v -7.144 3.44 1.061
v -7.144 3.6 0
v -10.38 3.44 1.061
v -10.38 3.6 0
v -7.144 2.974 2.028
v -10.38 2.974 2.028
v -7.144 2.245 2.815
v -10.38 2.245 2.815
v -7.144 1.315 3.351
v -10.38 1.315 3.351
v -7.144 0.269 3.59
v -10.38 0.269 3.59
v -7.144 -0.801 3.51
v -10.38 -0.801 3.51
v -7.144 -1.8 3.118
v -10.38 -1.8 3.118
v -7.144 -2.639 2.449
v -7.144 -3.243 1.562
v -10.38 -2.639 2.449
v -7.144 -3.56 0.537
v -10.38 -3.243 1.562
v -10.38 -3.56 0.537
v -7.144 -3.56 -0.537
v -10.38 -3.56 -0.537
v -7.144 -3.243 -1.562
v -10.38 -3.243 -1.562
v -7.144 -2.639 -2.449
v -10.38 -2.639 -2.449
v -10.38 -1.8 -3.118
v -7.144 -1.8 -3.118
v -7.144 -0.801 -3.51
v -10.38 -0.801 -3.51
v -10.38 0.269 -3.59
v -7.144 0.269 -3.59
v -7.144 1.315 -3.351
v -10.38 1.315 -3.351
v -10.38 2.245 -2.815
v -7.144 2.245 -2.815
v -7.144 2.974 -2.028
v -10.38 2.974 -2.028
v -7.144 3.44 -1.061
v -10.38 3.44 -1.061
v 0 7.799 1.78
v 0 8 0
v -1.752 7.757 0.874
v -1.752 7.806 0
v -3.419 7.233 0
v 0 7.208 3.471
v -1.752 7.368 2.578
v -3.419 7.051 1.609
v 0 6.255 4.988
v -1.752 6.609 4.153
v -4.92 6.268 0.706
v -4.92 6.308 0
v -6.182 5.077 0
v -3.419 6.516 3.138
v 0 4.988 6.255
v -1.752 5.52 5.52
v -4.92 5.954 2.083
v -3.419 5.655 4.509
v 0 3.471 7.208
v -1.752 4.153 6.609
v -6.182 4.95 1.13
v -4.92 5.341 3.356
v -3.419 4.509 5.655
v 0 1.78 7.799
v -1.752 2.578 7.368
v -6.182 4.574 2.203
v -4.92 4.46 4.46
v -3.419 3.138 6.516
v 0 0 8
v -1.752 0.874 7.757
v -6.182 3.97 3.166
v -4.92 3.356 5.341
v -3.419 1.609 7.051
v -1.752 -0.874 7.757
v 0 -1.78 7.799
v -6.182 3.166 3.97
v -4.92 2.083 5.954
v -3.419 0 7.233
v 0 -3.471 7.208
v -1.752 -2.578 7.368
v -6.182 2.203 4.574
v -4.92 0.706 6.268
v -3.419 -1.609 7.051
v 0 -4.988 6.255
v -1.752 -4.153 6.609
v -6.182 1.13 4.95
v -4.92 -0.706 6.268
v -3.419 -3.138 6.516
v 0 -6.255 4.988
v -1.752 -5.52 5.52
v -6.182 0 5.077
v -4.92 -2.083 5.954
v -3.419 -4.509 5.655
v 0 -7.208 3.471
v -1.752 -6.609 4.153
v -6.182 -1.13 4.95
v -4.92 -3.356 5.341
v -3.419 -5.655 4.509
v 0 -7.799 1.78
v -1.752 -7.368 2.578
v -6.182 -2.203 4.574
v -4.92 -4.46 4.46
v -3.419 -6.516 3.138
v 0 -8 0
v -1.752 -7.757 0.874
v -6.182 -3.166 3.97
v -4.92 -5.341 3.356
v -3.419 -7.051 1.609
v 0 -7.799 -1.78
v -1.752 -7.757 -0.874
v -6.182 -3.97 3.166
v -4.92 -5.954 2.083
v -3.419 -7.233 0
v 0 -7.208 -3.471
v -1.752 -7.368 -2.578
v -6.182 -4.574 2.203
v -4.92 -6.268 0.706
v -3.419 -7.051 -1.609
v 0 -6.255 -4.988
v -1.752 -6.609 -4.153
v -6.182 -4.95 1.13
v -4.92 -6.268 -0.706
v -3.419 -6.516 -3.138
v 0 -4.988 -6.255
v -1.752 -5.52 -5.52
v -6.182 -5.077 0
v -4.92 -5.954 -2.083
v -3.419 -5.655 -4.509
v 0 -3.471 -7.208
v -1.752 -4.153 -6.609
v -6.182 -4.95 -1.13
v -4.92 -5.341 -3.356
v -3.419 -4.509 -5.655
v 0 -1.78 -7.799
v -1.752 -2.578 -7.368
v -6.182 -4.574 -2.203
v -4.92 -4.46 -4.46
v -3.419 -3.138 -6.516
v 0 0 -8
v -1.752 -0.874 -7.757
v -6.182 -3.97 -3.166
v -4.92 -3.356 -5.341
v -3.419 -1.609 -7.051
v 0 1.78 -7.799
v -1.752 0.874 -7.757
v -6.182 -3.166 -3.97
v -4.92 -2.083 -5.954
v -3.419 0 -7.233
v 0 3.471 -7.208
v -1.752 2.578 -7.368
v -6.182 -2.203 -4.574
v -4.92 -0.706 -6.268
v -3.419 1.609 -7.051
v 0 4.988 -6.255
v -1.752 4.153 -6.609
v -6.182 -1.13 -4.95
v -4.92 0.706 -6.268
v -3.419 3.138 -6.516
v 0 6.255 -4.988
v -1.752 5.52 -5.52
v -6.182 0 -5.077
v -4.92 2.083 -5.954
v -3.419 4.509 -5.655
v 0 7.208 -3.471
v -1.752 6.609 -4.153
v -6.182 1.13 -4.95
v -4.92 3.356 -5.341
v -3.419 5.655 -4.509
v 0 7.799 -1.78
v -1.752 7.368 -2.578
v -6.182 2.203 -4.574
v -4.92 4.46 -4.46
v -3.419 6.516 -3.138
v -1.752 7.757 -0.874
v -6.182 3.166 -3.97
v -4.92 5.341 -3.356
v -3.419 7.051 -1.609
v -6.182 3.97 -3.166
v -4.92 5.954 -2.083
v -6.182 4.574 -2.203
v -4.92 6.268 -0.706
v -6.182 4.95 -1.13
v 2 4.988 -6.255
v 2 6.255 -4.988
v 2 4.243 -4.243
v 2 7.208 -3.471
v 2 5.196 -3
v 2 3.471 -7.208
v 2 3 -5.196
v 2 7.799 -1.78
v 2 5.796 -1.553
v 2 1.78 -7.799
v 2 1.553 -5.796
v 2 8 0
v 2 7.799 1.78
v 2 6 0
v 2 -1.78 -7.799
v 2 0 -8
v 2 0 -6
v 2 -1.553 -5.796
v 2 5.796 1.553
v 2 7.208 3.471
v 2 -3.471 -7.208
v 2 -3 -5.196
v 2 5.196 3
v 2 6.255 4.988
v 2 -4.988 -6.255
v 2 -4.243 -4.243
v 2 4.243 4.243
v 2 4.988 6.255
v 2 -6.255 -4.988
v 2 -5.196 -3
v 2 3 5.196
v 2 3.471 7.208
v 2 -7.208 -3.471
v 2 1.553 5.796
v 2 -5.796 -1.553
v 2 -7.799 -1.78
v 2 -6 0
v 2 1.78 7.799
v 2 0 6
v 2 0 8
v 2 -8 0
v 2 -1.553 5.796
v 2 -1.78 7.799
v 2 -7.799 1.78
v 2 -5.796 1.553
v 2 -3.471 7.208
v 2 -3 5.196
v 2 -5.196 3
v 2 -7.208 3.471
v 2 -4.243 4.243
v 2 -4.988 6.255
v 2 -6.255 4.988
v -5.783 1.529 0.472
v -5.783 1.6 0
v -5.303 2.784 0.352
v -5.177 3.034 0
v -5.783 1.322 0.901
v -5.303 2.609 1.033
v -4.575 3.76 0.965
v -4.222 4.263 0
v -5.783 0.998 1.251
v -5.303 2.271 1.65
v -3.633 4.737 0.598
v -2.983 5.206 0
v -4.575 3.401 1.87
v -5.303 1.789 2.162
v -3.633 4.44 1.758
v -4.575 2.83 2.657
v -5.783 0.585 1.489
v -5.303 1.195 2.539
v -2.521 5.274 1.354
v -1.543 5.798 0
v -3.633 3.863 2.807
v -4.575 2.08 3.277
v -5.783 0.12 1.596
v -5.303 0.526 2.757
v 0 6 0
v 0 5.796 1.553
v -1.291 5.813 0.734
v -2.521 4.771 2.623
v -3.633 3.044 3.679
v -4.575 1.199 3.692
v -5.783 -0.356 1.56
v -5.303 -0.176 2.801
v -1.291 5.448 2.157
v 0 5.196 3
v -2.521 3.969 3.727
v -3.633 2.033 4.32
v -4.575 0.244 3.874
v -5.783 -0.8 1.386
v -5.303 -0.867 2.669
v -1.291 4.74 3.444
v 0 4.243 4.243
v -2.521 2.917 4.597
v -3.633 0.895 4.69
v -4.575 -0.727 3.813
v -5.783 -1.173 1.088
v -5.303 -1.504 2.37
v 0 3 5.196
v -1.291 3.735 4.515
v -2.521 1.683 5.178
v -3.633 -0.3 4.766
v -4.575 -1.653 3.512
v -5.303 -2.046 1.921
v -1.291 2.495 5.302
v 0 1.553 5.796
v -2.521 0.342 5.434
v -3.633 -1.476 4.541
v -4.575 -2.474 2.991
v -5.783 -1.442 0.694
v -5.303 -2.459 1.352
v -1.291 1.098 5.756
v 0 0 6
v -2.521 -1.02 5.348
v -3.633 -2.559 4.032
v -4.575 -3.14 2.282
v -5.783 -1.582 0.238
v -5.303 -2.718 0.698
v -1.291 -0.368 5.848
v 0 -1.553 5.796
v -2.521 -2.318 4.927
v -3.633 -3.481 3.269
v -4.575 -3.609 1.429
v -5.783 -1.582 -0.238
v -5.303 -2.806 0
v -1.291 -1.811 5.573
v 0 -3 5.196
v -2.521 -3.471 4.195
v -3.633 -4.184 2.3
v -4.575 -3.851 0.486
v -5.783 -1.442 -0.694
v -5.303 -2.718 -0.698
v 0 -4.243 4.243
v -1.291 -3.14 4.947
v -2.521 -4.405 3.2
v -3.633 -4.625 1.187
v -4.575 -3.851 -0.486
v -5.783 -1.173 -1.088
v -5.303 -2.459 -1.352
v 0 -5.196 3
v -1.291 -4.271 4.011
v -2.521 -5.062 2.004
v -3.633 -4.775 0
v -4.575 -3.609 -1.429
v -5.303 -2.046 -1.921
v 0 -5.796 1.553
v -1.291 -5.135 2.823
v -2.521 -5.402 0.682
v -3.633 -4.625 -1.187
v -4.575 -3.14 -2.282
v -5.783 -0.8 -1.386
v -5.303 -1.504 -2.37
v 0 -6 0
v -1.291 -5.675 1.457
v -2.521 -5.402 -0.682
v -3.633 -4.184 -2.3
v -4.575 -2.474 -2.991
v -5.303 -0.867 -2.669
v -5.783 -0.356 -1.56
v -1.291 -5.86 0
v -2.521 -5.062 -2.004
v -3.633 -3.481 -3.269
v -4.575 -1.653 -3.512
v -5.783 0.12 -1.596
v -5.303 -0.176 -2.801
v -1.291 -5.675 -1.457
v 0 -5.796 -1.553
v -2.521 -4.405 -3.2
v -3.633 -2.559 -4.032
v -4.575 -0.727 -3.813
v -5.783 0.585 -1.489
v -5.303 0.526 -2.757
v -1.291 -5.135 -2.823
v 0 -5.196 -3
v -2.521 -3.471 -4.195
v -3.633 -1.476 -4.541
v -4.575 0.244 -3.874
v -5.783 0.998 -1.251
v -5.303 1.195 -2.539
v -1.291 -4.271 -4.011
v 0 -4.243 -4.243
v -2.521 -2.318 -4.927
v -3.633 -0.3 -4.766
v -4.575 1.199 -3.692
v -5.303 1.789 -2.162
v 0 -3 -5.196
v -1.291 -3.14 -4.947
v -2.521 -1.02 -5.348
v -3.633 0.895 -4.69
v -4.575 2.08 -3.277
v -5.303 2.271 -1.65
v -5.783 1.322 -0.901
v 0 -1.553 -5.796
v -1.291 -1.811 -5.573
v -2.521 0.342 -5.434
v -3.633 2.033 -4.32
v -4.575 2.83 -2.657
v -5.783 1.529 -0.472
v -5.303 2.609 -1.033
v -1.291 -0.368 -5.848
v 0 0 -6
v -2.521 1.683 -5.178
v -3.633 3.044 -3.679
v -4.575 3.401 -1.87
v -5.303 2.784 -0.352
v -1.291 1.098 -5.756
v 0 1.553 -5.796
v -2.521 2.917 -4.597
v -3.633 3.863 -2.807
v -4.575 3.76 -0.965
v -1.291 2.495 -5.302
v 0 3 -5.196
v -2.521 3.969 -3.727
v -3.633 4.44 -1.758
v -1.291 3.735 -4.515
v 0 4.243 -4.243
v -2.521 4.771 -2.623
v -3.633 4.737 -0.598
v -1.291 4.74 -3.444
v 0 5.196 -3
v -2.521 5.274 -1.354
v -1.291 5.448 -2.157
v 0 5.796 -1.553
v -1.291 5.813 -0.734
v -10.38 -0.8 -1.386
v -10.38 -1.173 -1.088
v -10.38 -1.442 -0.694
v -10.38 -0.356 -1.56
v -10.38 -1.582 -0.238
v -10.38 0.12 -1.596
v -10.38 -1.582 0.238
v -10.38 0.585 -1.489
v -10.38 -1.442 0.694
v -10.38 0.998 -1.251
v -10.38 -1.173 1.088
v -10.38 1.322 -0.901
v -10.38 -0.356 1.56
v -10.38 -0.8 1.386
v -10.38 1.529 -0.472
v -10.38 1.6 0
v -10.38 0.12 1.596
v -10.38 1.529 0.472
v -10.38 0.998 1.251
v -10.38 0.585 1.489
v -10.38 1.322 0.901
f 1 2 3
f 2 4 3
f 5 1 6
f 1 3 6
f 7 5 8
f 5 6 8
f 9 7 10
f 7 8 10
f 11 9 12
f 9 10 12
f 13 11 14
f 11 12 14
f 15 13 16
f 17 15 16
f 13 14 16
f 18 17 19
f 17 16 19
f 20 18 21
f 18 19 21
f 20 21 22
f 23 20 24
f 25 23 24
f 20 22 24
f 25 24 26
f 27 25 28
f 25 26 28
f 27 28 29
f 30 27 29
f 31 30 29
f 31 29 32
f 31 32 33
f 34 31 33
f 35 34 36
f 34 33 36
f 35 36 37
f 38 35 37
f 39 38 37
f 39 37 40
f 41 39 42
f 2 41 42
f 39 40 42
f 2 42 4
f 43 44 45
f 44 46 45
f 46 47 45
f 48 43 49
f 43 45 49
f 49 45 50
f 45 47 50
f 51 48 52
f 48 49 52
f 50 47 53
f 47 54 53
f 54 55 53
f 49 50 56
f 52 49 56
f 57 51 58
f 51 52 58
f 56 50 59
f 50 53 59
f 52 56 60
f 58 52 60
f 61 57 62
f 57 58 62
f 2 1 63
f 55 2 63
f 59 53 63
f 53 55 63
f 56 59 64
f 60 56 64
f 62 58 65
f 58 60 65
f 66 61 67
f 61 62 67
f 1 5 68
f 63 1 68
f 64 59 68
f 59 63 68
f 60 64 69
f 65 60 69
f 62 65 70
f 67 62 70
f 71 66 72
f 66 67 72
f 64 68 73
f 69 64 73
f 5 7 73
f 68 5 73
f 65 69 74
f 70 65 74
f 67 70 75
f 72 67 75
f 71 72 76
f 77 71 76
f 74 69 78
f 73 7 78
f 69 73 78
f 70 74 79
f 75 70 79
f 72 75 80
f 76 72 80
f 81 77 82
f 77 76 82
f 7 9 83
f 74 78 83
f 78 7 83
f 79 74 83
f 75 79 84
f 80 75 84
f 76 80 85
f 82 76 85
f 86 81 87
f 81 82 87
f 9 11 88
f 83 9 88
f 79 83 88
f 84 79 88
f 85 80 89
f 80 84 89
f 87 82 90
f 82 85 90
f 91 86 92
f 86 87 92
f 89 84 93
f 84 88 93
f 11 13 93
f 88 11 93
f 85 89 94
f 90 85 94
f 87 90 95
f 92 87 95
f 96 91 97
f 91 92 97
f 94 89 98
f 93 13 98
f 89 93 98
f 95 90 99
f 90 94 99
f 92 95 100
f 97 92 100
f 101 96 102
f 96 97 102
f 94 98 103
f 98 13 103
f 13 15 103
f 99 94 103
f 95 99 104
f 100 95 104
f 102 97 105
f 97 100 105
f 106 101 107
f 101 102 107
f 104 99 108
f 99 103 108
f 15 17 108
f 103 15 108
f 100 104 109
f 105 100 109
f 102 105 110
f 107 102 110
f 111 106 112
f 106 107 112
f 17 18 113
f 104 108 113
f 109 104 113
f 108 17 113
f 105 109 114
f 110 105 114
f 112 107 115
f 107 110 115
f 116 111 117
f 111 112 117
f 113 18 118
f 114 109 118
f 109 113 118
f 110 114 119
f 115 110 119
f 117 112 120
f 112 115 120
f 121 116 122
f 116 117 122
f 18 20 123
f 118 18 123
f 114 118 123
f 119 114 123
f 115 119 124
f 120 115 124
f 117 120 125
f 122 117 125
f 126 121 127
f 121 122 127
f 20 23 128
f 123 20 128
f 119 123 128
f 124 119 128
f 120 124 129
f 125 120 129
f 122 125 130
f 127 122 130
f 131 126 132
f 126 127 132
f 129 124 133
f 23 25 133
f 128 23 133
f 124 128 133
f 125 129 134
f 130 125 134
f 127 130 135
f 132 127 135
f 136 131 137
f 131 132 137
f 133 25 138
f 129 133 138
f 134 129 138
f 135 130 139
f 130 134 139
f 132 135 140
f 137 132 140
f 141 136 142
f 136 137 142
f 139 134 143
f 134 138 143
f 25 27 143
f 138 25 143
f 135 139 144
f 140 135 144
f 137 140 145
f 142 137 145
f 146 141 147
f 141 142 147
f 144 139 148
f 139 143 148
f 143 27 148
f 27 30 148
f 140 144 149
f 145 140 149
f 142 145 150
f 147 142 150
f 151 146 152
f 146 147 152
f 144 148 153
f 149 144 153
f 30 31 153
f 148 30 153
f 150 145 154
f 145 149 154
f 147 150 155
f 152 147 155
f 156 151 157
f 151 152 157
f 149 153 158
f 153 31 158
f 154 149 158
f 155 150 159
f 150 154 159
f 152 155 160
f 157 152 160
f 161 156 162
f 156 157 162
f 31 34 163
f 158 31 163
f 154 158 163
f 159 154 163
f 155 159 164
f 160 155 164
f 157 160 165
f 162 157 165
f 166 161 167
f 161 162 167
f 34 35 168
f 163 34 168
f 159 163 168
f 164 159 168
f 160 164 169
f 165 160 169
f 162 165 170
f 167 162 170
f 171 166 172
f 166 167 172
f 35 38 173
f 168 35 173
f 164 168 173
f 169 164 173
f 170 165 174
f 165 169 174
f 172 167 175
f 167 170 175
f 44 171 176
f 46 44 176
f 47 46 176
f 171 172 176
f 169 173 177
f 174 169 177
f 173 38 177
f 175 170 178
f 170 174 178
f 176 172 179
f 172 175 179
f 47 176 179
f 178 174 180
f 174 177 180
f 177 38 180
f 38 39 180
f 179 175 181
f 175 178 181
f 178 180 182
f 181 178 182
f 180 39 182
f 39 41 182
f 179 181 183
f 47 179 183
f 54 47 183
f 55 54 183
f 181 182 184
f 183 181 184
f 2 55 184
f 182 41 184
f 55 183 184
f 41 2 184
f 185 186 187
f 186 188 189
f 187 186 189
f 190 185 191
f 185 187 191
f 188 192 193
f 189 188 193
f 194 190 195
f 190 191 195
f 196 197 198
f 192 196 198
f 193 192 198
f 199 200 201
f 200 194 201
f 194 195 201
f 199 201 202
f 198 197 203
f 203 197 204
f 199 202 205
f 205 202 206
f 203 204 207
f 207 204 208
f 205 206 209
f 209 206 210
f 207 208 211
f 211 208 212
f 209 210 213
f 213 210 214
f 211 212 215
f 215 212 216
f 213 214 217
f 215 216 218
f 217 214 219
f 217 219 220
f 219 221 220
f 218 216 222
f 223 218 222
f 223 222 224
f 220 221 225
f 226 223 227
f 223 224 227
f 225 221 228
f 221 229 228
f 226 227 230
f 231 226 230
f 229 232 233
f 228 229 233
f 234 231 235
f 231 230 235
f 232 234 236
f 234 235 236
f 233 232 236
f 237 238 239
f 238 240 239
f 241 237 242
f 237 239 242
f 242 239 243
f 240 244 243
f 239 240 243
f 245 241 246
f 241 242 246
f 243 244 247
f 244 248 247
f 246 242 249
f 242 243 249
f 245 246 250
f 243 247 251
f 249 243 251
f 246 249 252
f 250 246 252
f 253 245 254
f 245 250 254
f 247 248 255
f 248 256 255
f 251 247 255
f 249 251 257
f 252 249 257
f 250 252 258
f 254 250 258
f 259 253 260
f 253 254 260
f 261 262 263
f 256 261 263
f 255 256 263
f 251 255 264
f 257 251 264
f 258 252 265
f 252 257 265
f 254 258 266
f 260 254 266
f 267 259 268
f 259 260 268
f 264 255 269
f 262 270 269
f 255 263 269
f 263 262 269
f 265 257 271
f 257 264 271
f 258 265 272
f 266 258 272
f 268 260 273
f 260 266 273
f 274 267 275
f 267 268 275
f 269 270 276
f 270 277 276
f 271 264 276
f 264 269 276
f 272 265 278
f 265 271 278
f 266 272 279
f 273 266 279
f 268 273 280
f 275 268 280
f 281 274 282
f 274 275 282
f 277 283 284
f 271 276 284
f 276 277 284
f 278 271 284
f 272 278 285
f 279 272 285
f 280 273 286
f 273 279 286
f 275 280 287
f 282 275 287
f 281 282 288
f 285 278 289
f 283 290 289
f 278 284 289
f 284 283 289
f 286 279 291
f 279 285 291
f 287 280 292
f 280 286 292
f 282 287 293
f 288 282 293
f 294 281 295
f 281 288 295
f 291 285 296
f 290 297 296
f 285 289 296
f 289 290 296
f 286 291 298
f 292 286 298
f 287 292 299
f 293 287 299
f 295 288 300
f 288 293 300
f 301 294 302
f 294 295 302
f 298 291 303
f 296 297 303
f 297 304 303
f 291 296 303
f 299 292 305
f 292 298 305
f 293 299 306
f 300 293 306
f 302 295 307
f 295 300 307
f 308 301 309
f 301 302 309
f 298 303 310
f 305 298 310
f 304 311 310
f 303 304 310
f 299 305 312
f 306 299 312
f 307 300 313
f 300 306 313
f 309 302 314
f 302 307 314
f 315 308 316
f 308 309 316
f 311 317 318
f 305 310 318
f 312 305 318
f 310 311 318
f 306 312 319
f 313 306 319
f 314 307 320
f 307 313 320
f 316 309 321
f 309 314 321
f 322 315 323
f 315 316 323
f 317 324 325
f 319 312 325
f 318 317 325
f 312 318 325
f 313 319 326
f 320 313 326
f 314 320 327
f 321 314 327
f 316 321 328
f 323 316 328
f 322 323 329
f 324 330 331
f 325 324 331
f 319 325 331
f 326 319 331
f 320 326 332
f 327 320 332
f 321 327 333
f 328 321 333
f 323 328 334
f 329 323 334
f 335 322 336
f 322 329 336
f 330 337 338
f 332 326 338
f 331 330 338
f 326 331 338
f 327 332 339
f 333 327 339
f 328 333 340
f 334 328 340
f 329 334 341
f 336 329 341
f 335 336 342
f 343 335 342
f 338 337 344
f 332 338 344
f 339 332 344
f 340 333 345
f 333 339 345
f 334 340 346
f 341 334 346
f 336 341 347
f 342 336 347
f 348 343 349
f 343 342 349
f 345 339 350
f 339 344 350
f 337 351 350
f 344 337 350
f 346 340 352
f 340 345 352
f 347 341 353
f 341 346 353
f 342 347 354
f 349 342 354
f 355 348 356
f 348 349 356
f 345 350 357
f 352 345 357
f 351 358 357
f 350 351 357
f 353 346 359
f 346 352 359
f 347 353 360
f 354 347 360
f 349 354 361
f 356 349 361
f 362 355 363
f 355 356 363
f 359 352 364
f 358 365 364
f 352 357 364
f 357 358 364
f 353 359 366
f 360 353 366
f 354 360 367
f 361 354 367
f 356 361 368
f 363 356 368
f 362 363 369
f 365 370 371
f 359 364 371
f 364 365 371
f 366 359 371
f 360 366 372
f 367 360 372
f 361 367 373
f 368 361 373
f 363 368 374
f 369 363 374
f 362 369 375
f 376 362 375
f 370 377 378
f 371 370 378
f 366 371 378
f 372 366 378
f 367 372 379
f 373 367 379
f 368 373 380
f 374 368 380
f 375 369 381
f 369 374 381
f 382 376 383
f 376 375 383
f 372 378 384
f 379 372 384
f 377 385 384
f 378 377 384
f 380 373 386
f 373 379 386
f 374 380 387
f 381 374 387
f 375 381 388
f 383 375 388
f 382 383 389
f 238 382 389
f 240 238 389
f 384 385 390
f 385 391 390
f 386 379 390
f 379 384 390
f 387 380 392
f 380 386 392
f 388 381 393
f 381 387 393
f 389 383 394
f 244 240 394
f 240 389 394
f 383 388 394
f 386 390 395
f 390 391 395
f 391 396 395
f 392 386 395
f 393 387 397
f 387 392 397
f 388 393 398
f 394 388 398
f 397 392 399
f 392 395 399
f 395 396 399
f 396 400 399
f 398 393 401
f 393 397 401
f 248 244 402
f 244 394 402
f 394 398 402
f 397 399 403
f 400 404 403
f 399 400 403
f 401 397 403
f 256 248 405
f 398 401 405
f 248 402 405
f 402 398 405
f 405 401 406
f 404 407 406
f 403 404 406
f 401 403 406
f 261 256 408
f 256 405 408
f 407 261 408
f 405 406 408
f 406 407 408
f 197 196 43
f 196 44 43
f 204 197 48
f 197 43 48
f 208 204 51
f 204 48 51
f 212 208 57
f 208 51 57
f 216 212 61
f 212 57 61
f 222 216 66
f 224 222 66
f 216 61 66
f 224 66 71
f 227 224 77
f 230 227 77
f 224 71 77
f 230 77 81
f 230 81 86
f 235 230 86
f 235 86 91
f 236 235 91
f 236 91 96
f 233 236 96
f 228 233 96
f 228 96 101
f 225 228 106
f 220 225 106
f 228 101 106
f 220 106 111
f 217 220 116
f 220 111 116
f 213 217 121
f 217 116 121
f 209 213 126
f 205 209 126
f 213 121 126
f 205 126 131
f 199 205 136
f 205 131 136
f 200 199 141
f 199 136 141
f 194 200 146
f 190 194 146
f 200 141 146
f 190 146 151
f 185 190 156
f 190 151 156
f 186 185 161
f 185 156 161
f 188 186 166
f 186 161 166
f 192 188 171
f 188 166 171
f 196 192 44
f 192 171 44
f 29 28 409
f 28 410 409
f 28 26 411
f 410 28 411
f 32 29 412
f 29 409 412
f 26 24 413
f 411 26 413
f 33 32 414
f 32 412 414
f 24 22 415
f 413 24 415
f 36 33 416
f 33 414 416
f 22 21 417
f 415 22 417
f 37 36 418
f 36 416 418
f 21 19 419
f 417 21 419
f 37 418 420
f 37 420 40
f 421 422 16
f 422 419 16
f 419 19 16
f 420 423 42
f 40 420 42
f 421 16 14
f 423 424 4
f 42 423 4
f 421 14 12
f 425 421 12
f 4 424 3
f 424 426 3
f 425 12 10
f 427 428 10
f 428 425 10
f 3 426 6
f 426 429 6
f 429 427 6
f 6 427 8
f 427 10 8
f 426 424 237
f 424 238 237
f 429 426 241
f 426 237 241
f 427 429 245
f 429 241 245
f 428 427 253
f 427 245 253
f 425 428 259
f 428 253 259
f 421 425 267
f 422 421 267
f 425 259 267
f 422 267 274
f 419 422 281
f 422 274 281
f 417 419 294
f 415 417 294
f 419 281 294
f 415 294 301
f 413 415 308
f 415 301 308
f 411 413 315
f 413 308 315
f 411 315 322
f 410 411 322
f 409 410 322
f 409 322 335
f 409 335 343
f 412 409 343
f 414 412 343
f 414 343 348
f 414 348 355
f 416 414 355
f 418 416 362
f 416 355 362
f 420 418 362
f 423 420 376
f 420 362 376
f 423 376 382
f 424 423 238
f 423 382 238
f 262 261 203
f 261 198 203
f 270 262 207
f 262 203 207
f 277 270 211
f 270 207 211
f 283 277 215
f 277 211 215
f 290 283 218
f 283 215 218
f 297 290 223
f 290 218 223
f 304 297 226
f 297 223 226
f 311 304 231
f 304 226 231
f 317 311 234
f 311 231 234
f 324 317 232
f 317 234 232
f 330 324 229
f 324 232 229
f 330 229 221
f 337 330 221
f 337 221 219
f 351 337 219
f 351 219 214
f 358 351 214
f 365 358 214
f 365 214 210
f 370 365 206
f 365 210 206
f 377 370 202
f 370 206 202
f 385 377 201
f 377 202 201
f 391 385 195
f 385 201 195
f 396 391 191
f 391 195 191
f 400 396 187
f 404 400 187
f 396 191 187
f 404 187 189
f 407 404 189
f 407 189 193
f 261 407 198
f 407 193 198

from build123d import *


with BuildPart() as part:
    # Sketch1 → Revolve1 (revolve)
    with BuildSketch(Plane.XY):
        with BuildLine():
            Line((-10.380317683, 1.6), (-7.838367177, 1.6))
            Line((-7.838367177, 1.6), (-5.782732918, 1.6))
            ThreePointArc((-5.782732918, 1.6), (-3.633180425, 4.774934555), (0, 6))
            Line((0, 6), (2, 6))
            Line((2, 6), (2, 8))
            Line((2, 8), (0, 8))
            ThreePointArc((0, 8), (-4.195235393, 6.811754546), (-7.14422844, 3.6))
            Line((-7.14422844, 3.6), (-10.380317683, 3.6))
            Line((-10.380317683, 3.6), (-10.380317683, 1.6))
        make_face()
    revolve(axis=Axis((-14.839725853, 0, 0), (1, 0, 0)))


solid = part.part
